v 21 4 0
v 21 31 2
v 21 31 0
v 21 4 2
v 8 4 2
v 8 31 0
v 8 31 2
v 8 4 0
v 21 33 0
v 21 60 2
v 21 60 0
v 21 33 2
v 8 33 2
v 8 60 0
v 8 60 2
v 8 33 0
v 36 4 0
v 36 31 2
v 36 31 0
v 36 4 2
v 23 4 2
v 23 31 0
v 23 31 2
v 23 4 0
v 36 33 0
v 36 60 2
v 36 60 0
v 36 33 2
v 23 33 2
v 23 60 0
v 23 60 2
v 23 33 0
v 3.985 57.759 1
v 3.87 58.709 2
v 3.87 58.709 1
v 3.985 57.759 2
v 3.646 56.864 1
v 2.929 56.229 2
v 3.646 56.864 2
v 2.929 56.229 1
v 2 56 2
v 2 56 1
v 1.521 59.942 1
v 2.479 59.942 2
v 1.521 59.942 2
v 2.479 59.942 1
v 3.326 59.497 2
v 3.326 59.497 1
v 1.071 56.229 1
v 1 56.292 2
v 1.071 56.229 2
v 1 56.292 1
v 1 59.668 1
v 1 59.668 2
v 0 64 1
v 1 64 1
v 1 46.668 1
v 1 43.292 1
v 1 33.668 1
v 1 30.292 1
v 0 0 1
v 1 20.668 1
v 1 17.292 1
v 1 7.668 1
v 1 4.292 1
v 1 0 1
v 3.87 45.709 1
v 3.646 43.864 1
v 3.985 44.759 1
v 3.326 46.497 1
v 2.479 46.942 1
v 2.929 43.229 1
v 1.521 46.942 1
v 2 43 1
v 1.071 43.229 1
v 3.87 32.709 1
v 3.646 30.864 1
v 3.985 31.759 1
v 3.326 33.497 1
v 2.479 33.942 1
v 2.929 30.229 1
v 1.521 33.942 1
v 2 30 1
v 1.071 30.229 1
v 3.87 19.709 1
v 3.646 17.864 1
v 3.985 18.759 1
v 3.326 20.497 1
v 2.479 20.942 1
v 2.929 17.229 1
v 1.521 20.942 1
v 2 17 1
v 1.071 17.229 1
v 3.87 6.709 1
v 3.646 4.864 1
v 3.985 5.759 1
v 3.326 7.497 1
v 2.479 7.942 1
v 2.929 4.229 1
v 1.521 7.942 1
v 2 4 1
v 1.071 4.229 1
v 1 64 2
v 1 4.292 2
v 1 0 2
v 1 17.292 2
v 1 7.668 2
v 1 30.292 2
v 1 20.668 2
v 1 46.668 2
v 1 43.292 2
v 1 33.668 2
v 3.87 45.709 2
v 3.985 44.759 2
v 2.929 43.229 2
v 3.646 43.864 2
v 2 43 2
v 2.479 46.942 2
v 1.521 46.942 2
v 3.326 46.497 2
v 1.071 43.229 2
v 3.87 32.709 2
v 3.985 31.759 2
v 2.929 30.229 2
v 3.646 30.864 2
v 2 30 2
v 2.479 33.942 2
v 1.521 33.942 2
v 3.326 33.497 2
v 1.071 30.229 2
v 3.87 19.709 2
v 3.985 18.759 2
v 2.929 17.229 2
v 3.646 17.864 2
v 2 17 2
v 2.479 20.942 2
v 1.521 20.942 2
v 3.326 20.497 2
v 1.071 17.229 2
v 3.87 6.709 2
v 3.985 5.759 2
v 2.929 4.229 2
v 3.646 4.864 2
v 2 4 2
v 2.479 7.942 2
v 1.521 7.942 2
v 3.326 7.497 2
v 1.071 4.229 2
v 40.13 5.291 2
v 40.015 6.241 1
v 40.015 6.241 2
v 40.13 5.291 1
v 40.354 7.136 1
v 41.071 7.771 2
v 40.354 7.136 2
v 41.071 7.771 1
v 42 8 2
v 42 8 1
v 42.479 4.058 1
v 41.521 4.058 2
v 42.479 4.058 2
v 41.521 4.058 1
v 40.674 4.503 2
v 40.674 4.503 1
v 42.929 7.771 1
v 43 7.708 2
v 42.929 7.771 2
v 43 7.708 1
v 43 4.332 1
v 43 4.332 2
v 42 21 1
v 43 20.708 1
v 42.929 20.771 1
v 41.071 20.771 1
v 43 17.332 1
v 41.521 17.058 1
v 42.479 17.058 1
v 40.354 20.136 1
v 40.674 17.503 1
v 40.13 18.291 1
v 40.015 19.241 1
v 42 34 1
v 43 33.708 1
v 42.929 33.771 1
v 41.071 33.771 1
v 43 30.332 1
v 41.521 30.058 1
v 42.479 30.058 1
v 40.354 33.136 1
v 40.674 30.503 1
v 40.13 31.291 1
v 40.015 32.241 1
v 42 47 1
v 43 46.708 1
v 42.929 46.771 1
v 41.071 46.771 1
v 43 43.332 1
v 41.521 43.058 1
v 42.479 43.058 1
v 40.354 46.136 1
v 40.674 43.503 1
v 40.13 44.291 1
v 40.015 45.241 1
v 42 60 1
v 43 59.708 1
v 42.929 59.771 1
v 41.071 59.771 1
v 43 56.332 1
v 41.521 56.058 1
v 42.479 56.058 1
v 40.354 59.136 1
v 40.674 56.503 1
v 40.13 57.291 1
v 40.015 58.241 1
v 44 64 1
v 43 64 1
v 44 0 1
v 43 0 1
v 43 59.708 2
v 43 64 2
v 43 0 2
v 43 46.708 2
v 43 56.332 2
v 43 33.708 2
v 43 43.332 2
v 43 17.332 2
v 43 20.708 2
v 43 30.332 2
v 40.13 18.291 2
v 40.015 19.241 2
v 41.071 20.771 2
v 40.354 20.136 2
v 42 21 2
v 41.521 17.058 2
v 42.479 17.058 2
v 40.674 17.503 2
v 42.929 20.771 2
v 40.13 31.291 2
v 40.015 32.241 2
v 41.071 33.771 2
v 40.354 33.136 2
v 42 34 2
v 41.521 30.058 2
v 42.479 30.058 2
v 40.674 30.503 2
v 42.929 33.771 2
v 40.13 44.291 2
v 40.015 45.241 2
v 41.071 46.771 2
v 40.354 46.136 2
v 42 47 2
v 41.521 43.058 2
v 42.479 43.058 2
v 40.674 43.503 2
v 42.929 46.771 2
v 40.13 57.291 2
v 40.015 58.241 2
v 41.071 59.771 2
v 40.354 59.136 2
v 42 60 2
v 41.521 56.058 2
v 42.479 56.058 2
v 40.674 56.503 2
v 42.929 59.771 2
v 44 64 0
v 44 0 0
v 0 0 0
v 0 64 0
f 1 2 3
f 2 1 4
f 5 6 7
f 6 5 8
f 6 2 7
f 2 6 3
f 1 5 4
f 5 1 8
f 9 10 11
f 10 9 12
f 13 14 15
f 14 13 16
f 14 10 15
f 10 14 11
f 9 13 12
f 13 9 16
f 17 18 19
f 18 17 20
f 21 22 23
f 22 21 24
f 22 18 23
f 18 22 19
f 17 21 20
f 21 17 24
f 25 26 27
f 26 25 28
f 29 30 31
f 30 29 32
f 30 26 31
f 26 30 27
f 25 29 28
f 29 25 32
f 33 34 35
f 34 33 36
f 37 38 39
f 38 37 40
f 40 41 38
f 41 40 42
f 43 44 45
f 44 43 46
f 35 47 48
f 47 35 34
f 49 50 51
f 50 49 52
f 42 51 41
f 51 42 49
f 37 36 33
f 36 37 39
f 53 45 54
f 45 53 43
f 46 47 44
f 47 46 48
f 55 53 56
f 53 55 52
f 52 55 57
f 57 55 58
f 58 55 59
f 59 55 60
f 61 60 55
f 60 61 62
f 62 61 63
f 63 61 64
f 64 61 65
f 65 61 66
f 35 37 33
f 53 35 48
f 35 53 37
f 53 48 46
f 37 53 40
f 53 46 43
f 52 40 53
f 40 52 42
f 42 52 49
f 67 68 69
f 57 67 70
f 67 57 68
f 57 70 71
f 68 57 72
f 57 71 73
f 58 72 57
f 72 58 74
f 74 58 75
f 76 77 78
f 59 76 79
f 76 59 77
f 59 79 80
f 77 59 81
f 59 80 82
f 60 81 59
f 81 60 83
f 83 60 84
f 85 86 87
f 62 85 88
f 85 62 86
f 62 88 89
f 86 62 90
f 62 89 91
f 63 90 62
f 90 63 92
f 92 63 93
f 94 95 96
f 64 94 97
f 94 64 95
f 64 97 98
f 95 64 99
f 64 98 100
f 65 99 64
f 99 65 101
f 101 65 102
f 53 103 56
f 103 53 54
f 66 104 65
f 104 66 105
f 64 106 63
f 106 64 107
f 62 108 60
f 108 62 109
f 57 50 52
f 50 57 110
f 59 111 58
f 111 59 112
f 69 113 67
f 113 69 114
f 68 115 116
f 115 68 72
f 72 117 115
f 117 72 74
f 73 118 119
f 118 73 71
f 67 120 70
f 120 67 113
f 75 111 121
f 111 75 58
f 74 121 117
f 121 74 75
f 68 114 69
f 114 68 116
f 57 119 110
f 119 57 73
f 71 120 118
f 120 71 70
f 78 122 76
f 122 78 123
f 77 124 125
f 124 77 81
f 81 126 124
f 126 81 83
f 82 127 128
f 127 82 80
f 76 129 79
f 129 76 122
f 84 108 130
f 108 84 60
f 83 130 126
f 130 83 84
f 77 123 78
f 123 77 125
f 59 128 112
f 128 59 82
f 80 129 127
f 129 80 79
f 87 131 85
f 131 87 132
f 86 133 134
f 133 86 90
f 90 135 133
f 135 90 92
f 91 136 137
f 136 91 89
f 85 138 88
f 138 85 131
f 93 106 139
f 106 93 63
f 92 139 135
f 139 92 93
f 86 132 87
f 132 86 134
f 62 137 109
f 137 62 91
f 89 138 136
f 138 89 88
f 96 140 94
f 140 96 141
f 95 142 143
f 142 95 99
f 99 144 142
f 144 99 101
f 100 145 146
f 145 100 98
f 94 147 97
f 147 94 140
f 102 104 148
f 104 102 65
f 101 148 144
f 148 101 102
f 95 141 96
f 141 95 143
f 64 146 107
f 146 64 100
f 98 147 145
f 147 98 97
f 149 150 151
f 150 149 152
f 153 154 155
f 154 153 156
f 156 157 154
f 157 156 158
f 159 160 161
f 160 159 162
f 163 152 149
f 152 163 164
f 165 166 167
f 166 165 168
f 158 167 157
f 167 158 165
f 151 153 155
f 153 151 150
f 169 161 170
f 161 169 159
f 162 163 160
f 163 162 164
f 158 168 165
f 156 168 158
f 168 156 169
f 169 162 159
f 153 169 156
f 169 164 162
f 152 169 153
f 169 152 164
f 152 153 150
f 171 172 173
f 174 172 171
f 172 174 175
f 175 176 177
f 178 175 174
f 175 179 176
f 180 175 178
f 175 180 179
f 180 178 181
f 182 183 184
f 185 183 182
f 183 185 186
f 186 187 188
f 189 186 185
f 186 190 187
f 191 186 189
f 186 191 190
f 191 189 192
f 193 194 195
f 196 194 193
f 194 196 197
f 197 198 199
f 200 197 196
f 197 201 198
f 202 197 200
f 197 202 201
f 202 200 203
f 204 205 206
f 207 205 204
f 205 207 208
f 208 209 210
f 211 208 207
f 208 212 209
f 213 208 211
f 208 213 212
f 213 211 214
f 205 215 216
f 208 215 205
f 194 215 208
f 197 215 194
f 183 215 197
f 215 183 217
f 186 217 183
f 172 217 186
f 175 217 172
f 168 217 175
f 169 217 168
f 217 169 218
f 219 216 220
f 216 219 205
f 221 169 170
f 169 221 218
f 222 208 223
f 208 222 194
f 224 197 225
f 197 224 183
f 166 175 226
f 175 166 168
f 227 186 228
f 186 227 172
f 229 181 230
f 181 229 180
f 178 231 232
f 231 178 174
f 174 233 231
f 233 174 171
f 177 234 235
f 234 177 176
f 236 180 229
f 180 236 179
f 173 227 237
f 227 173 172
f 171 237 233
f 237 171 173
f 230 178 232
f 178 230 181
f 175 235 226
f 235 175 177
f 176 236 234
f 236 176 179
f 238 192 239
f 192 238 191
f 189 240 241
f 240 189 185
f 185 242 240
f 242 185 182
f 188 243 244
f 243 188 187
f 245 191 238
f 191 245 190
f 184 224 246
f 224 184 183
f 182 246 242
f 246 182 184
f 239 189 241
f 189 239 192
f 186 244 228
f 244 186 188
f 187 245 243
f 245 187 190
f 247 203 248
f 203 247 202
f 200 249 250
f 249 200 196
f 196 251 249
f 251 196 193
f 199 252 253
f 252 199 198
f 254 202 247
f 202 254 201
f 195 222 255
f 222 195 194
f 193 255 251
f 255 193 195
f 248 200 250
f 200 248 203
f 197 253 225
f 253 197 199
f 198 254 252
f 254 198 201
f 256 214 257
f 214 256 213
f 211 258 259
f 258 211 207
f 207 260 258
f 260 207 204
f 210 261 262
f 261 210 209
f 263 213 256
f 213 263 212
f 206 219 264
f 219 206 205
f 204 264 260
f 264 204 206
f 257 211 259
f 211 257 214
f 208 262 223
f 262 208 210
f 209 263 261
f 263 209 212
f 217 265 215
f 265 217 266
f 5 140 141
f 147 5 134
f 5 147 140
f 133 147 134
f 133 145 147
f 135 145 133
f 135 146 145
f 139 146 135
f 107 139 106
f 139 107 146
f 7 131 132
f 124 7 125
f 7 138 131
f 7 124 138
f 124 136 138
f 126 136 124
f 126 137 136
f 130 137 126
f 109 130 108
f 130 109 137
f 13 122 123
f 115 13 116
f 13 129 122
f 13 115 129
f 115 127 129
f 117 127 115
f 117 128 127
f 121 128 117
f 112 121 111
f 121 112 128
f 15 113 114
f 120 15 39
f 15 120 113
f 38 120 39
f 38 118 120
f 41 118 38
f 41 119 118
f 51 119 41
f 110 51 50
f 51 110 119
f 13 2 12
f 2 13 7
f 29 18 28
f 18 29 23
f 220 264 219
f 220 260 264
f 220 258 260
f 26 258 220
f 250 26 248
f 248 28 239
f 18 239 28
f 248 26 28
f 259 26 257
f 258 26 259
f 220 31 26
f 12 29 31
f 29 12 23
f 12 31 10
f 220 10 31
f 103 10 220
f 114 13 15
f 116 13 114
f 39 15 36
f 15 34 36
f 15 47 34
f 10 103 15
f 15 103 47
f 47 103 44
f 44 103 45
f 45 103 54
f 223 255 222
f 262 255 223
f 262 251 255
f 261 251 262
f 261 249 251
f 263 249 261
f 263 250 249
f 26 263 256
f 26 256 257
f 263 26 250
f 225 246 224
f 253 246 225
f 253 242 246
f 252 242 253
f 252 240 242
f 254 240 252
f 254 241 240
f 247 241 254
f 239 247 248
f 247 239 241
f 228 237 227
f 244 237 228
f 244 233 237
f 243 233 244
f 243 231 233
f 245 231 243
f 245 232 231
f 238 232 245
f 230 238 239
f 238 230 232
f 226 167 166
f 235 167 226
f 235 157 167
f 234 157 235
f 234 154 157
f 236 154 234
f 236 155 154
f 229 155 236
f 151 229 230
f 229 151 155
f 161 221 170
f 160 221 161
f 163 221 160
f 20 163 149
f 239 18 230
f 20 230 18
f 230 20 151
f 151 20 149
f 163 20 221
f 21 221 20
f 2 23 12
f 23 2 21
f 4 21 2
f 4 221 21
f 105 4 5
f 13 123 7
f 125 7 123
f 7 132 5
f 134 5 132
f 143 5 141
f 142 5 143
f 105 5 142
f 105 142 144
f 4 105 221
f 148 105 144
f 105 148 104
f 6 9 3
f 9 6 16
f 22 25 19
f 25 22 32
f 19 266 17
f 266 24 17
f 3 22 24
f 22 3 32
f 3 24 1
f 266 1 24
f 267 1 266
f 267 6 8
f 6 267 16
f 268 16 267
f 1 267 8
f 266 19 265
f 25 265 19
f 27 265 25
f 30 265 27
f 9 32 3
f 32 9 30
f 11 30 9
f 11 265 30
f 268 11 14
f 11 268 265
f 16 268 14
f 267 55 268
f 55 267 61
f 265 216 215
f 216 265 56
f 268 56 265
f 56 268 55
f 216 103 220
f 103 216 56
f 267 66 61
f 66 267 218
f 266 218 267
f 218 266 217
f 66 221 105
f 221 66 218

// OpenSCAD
// file: ../기타/corner-hole.scad
module ellipsis(w, h) {
	translate([w / 2, h / 2, 0])
		resize([w, h, 1024])
			cylinder(1024, 1024, 1024);
}
module cornerHole(base, m, in, out, height) {
	delta = (out - in) / 2;
		translate([m,					m,					0])	ellipsis(in, in);
		translate([base[0] - m,	m,					0])	ellipsis(in, in);
		translate([base[0] - m,	base[1] - m,		0])	ellipsis(in, in);
		translate([m,					base[1] - m,		0])	ellipsis(in, in);

		translate([m - delta,					m - delta,					height])	ellipsis(out, out);
		translate([base[0] - m  - delta,	m - delta,					height])	ellipsis(out, out);
		translate([base[0] - m  - delta,	base[1] - m - delta,	height])	ellipsis(out, out);
		translate([m - delta,					base[1] - m - delta,	height])	ellipsis(out, out);
}
// file: ../상판/common.scad
use <MCAD/boxes.scad>
use <../기타/corner-hole.scad>
use <../기타/utils.scad>

PALETTE = [
	[0.3, 0.1, 0.0, 1.0],	//	갈색, 칼손잡이
	[0.5, 0.5, 0.5, 0.5],	//	회색, 칼날
	[0.9, 0.9, 0.9, 1.0],	//	흰색, 상판
	[0.0, 0.0, 0.9, 0.5],	//	파랑
	[0.0, 0.0, 0.0, 0.0]	//	검정 투명, 호환성 예약
];
ZERO = [0, 0, 0];
HALF = [1/2, 1/2, 1/2];
ONE = [1, 1, 1];
EPSILON = 0.1;

// export
function chefsInfo(delta = 8)  = [(3 + 3 + 3) + (16 + 16) + delta * 5, (3 + 4 + 5) + (15 + 20)];	//	[x위치, 길이]
function coreWidth(delta = 8)  = (3 + 3 + 3) + (16 + 16) + delta * 5 + chefsInfo(delta)[1];
function coreSize(delta = 8, thick = 8)  = [coreWidth(delta), 60, thick];

module test(delta = 4) {
	a = [];
	dx = 0;
	for (cx = [0:delta: 256]) {
		dx = dx + delta;
		a = concat(a, [dx]);
		echo(dx, a);
	}
}
//test();

module	roundedBoxNotCenter(size = [32, 64, 8], radius = 8, sidesonly = true) {
	translate([size[0] / 2, size[1] / 2, size[2] / 2])		roundedBox(size, radius, sidesonly);
}

// export
module punch(height = 60, thick = 8, delta = 8) {
	// 과도, 빵칼
	breadStart = 0;
	translate([breadStart, 0, 0])					roundedBoxNotCenter([3, height, thick], 1);
	translate([breadStart + (3 + delta), 0, 0])		roundedBoxNotCenter([3, height, thick], 1);
	translate([breadStart + (3 + delta) * 2, 0, 0])	roundedBoxNotCenter([3, height, thick], 1);
	breadLength = (3 + delta) * 2 + 3;

	// 가위
	scissorStart = breadStart + breadLength + delta;
	scissor = [16, 40];
	translate([scissorStart,						(height - scissor[1]) / 2, 0])	ellipsis(scissor[0], scissor[1], thick);
	translate([scissorStart + scissor[0] + delta,	(height - scissor[1]) / 2, 0])	ellipsis(scissor[0], scissor[1], thick);
	scissorLength = scissor[0] * 2 + delta;
	
	//	식도
	chefsStart = scissorStart + scissorLength + delta;
	translate([chefsStart, 0, 0])						roundedBoxNotCenter([3, height, thick], 1);
	translate([chefsStart + 3 + 15, 0, 0])				roundedBoxNotCenter([4, height, thick], 1);
	translate([chefsStart + (3 + 4) + (15 + 20), 0, 0])	roundedBoxNotCenter([5, height, thick], 1);
	chefsLength = (3 + 4 + 5) + (15 + 20);
	echo("last x position, ie width", delta, breadStart, breadLength, scissorStart, scissorLength, chefsStart, chefsLength);
}
punch();
// file: ../기타/utils.scad
use <MCAD/boxes.scad>

BIG = [1024, 1024, 1024];

module boardPattern(size = [128, 64, 4], degree = 60, stick = [THICK, THICK, 32]) {
	intersection() {
		cube([size[0], size[1], stick[1]]);
		for (dx = [-1024: stick[2]: 1024]) {
			translate([dx, -cos(degree) * stick[1], -1])	rotate([0, 0, degree])	cube([1024, stick[0], stick[1]]);
			mirror([1, 0, 0])
			translate([dx, -cos(degree) * stick[1], -1])	rotate([0, 0, degree])	cube([1024, stick[0], stick[1]]);
		}
	}
}
module mark(name, height, size = 2) {
	linear_extrude(height, center = false)	text(name, size = size);
}
module hole(w, h, z) {
	translate([w / 2, h / 2, z / 2])		roundedBox(size=[w, h, z], radius = w / 4, sidesonly = true);
}
module ellipsis(w = 32, h = 16, z = 4) {
	translate([w / 2, h / 2, 0])
		resize([w, h, z])
			cylinder(1024, 1024, 1024);
}
module cornerHole(base, m, in, out, height) {
	delta = (out - in) / 2;
		translate([m,					m,					0])	ellipsis(in, in);
		translate([base[0] - m,	m,					0])	ellipsis(in, in);
		translate([base[0] - m,	base[1] - m,		0])	ellipsis(in, in);
		translate([m,					base[1] - m,		0])	ellipsis(in, in);

		translate([m - delta,					m - delta,					height])	ellipsis(out, out);
		translate([base[0] - m  - delta,	m - delta,					height])	ellipsis(out, out);
		translate([base[0] - m  - delta,	base[1] - m - delta,	height])	ellipsis(out, out);
		translate([m - delta,					base[1] - m - delta,	height])	ellipsis(out, out);
}
module lineBox(outter = [100, 100, 100], t = 2) {
	size = outter - [t*2, t*2, t*2];
	center = false;

	translate([t, t, t])	{
		
	// x
	translate([0, 0, 0])						rotate([0, 90, 0])		cylinder(h = size[0], r = t, center = center);
	translate([0, size[1], 0])			rotate([0, 90, 0])		cylinder(h = size[0], r = t, center = center);
	translate([0, size[1], size[2]])	rotate([0, 90, 0])		cylinder(h = size[0], r = t, center = center);
	translate([0, 0, size[2]])			rotate([0, 90, 0])		cylinder(h = size[0], r = t, center = center);

	// y
	translate([0, 0, 0])						rotate([270, 0, 0])		cylinder(h = size[1], r = t, center = center);
	translate([size[0], 0, 0])			rotate([270, 0, 0])		cylinder(h = size[1], r = t, center = center);
	translate([size[0], 0, size[2]])	rotate([270, 0, 0])		cylinder(h = size[1], r = t, center = center);
	translate([0, 0, size[2]])			rotate([270, 0, 0])		cylinder(h = size[1], r = t, center = center);

	// z
	translate([0, 0, 0])						rotate([0, 0, 0])		cylinder(h = size[2], r = t, center = center);
	translate([size[0], 0, 0])			rotate([0, 0, 0])		cylinder(h = size[2], r = t, center = center);
	translate([size[0], size[1], 0])	rotate([0, 0, 0])		cylinder(h = size[2], r = t, center = center);
	translate([0, size[1], 0])	rotate([0, 0, 0])				cylinder(h = size[2], r = t, center = center);
	}
}
module hide(show = 0) {
	if (show > 0) children();
	else scale([0, 0, 0])	children();
}

module t() {
	c = [0.5, 0.5, 0.5, 0.5];
	d = [0.5, 0.5, 0.0, 0.5];
	
	color(c)	difference() {
		cube([4, 16, 2]);
		translate([2, -2, -1])	cube([4, 4, 4]);
	}
	color(d)	translate([8, 0, 0])	cube([16, 4, 2]);
}

module test(b) {
	
	c = [0.5, 0.5, 0.5, 0.5];
	d = [0.5, 0.5, 0.0, 0.5];
	
	color(c)	difference() {
		cube(b);
		translate([-BIG[0]+b[1]/2, b[1]/2, -BIG[2] / 2])	cube(BIG);
		//translate([b[0]-b[1]/2, b[1]/2, -1])	cube([b[1], b[1], b[2]*2]);
	}
}
		//translate([-BIG[0]+16, 16, 0])	cube(BIG);
test([16, 4, 2]);
//cube(BIG);
// file: ../상판/landscape.scad
use <MCAD/boxes.scad>
use <common.scad>
use <../기타/corner-hole.scad>
use <../기타/utils.scad>

PALETTE = [
	[0.3, 0.1, 0.0, 0.5],	//	갈색, 칼손잡이
	[0.5, 0.5, 0.5, 0.5],	//	회색, 칼날
	[0.9, 0.9, 0.9, 1.0],	//	흰색, 상판
	[0.0, 0.0, 0.9, 0.5],	//	파랑
	[0.0, 0.0, 0.0, 0.0]	//	검정 투명, 호환성 예약
];
ZERO = [0, 0, 0];
EPSILON = 0.1;

// 주요 상수
MARGIN = 12;
THICK = 8;
DELTA = 8;

// export
function landscapeSize()  = coreSize(DELTA, THICK) + [MARGIN * 2, MARGIN * 2, 0];
module landscape() {
	base =  landscapeSize();	//	상판
	t = base[2];		//	thick 껍질 두께
	m = MARGIN;	//	margin 여유

	difference() {
		union() {
			//	상판
			color(c=PALETTE[2])		translate([base[0] / 2, base[1] / 2, t / 2])	roundedBox(base, 2, true);
			
			//	서명
			color(c=PALETTE[1])		translate([base[0] - m / 2 - 2, m / 4, t])		mark("andold", 0.2, 1);

			//	손잡이
			chefsInfo = chefsInfo();
			translate([m + chefsInfo[0] - t, m - t, 0])		color(c=PALETTE[0])
			roundedBoxNotCenter([chefsInfo[1] + t * 2, base[1] / 2, t * 2], 2, true);
		}
		translate([m, m, -EPSILON])	punch(60, 16 + EPSILON * 2, 8);
	}
}
HALF = [1/2, 1/2, 1/2];
ONE = [1, 1, 1];
scale(ONE)
scale(HALF)
landscape();
// main file
use <MCAD/boxes.scad>
use <../상판/landscape.scad>
use <../기타/utils.scad>

ZERO = [0, 0, 0];
HALF = [1/2, 1/2, 1/2];
ONE = [1, 1, 1];
EPSILON = 0.2;

// 주요 상수
THICK = 4;
HEIGHT = 240;
HEIGHT_TOP = 128;
OVERLAP = 32;
OPACITY = 0.75;

function bodyTopSize()  = [landscapeSize()[0] + THICK, landscapeSize()[1] + THICK, HEIGHT_TOP];
function	bodyBottomSize() = [
	bodyTopSize()[0] + THICK,
	bodyTopSize()[1] + THICK,
	HEIGHT - bodyTopSize()[2] + OVERLAP];

module boardHold(x, y, z, dx = 16, dy = 0, countx = 2, county = 2) {
	echo(x, y, z, dx, dy, countx, county);
	w = (x - dx * 2 - z) / countx;
	h = (y - dy * 2 - z) / county;
	for (cw = [dx + z:w:x - (dx + z) * 2]) {
		for (ch = [dy + z:h:y - (dy + z) * 2]) {
			echo(w, h, cw, ch);
			translate([cw, ch, -1])	cube([w - z, h - z, z * 4], center = false);
		}
	}
}

module bulges(x = 128, y = 6, z = 4, count = 5) {
	r = y / 0.75 / 2;
	dx = (x - r * 2) / (count - 1);
	for (cx = [0: dx: x]) {
		translate([cx, 0, 0])	intersection() {
			translate([r, r * 2 - y, 0])	cylinder(z, r, r);
			cube([r * 2, r * 2, z]);
		}
	}
}
//
//rotate([90, 0, -90])	bulges();
//bodyTopFront();
//translate([164, 0, 0])	bodyTopSide();
module board(x = 160, y = 128, z = 4, even = false, dz = THICK * 2, count = 5) {
	echo("board", x, y, z, even, dz, count);
	union() {
		difference() {
			union() {
				cube([x, y, z]);
				if (even) {
				} else {
					translate([z / 2 * 3, y - dz, z])	rotate([90, 0, -90])	bulges(y - dz * 2, z * 2 * 0.75, z, count);
					translate([x - z / 2 * 3, dz, z])	rotate([90, 0, 90])		bulges(y - dz * 2, z * 2 * 0.75, z, count);
				}
			}
			
			// 면 조립부분 홈파기
			translate([-1024 + z / 2, -1, z / 2])	cube(1024);
			translate([x - z / 2, -1, z / 2])		cube(1024);
			boardHold(x, y, z, 12, 4, ceil(x / 48), floor(y / 64));

			if (even) {
				translate([z / 2, y - dz, z / 2])	rotate([0, 0, -90])	bulges(y - dz * 2, z * 2 * 0.75, z, count);
				translate([x - z / 2, dz, z / 2])	rotate([0, 0, 90])	bulges(y - dz * 2, z * 2 * 0.75, z, count);
			} else {
			}
		}
	}
}
//board(256, 128, 8, false, 16, 5);
// 조립시 바깥쪽
module bodyTopFront() {
	base = bodyTopSize();
	color("DarkKhaki", OPACITY)	board(base[0] + THICK, base[2], THICK, false);
}
//bodyTopFront();

// 조립시 안쪽
module bodyTopSide() {
	base = bodyTopSize();
	color("Blue", OPACITY)	board(base[1], base[2], THICK, true);
}
//bodyTopSide();

module bodyBottomFront() {
	base = bodyBottomSize();
	color("Fuchsia", OPACITY)	board(base[0] + THICK * 3, HEIGHT - base[2] + OVERLAP, THICK, false, OVERLAP);
}
//bodyBottomFront();
module compareFront() {
	bodyBottomFront();
	translate([THICK, HEIGHT - bodyTopSize()[2] + OVERLAP + 1, 0])	boardTopFront();
}
//compareFront();

module bodyBottomSide() {
	base = bodyBottomSize();
	color("MediumSlateBlue", OPACITY)	board(base[1] + THICK * 2,  HEIGHT - base[2] + OVERLAP, THICK, true, OVERLAP);
}
//bodyBottomSide();

module compareSide() {
	bodyBottomSide();
	translate([THICK, HEIGHT - bodyTopSize()[2] + OVERLAP + 1, 0])	boardTopSide();
}
//compareSide();

// 크기 제한으로 상하단으로 분리한다.
module bodyTop() {
	bodyTopFront();
	translate([0, bodyTopSize()[2] + 4, 0])	bodyTopSide();
}
//scale(HALF)	bodyTop();

module assempleBodyBottom(help = 8) {
	base = bodyBottomSize();

	translate([0, 0, base[2]])	rotate([-90, 0, 0])	bodyBottomFront();
	translate([base[0] + THICK * 2, base[1] + THICK * 2 + help * 2, 0])	rotate([0, 0, 180])	translate([0, 0, base[2]])	rotate([-90, 0, 0])	bodyBottomFront();
	translate([base[0] + THICK * 2, THICK / 2 + help, base[2]])	rotate([-90, 0, 90])	bodyBottomSide();
	translate([base[0] + THICK * 2, base[1] + THICK * 2 + help, 0])	rotate([0, 0, 180])	translate([base[0] + THICK * 2, THICK / 2, base[2]])	rotate([-90, 0, 90])	bodyBottomSide();
}
//assempleBodyBottom(0);

module bodyBottom() {
	bodyBottomFront();
	translate([bodyBottomSize()[0] + THICK * 4, 0, 0])	bodyBottomSide();
}

module assempleBodyTop(help = 8) {
	base = bodyTopSize();

	translate([0, 0, base[2]])	rotate([-90, 0, 0])	bodyTopFront();
	translate([base[0] + THICK, base[1] + THICK + help + help, 0])	rotate([0, 0, 180])	translate([0, 0, base[2]])	rotate([-90, 0, 0])	bodyTopFront();

	translate([base[0] + THICK, THICK / 2 + help, base[2]])		rotate([-90, 0, 90])		bodyTopSide();
	translate([base[0] + THICK, base[1] + THICK + help, 0])	rotate([0, 0, 180])	translate([base[0] + THICK, THICK / 2, base[2]])		rotate([-90, 0, 90])		bodyTopSide();
}
//assempleBodyTop(10);
module assempleBody(help = 8) {
	base = bodyTopSize();
	assempleBodyBottom(help);
	translate([THICK, THICK, HEIGHT])	assempleBodyTop(help);
//	translate([THICK * 2, THICK* 2, HEIGHT + HEIGHT_TOP + 8])	landscape();
}
//assempleBody(8);

module build() {
	//scale(HALF)	bodyTopFront();
	scale(HALF)	bodyTopSide();
//	translate([0, bodyTopSize()[2] + 4, 0])	bodyTopSide();
	//scale(HALF)	bodyTop();	scale(HALF)	translate([bodyTopSize()[0] + 16, 0, 0])	bodyTop();
	//scale(HALF)	bodyBottom();	scale(HALF)	translate([0, bodyBottomSize()[2] + 4, 0])	bodyBottom();
}
build();

//scale(HALF)	bodyTop();	scale(HALF)	translate([bodyTopSize()[0] + 16, 0, 0])	bodyTop();
//scale(HALF)	bodyBottom();	scale(HALF)	translate([0, bodyBottomSize()[2] + 4, 0])	bodyBottom();
//bodyBottomFront();
//bodyBottomSide();
//halfBodyTop();
//assempleBody();
